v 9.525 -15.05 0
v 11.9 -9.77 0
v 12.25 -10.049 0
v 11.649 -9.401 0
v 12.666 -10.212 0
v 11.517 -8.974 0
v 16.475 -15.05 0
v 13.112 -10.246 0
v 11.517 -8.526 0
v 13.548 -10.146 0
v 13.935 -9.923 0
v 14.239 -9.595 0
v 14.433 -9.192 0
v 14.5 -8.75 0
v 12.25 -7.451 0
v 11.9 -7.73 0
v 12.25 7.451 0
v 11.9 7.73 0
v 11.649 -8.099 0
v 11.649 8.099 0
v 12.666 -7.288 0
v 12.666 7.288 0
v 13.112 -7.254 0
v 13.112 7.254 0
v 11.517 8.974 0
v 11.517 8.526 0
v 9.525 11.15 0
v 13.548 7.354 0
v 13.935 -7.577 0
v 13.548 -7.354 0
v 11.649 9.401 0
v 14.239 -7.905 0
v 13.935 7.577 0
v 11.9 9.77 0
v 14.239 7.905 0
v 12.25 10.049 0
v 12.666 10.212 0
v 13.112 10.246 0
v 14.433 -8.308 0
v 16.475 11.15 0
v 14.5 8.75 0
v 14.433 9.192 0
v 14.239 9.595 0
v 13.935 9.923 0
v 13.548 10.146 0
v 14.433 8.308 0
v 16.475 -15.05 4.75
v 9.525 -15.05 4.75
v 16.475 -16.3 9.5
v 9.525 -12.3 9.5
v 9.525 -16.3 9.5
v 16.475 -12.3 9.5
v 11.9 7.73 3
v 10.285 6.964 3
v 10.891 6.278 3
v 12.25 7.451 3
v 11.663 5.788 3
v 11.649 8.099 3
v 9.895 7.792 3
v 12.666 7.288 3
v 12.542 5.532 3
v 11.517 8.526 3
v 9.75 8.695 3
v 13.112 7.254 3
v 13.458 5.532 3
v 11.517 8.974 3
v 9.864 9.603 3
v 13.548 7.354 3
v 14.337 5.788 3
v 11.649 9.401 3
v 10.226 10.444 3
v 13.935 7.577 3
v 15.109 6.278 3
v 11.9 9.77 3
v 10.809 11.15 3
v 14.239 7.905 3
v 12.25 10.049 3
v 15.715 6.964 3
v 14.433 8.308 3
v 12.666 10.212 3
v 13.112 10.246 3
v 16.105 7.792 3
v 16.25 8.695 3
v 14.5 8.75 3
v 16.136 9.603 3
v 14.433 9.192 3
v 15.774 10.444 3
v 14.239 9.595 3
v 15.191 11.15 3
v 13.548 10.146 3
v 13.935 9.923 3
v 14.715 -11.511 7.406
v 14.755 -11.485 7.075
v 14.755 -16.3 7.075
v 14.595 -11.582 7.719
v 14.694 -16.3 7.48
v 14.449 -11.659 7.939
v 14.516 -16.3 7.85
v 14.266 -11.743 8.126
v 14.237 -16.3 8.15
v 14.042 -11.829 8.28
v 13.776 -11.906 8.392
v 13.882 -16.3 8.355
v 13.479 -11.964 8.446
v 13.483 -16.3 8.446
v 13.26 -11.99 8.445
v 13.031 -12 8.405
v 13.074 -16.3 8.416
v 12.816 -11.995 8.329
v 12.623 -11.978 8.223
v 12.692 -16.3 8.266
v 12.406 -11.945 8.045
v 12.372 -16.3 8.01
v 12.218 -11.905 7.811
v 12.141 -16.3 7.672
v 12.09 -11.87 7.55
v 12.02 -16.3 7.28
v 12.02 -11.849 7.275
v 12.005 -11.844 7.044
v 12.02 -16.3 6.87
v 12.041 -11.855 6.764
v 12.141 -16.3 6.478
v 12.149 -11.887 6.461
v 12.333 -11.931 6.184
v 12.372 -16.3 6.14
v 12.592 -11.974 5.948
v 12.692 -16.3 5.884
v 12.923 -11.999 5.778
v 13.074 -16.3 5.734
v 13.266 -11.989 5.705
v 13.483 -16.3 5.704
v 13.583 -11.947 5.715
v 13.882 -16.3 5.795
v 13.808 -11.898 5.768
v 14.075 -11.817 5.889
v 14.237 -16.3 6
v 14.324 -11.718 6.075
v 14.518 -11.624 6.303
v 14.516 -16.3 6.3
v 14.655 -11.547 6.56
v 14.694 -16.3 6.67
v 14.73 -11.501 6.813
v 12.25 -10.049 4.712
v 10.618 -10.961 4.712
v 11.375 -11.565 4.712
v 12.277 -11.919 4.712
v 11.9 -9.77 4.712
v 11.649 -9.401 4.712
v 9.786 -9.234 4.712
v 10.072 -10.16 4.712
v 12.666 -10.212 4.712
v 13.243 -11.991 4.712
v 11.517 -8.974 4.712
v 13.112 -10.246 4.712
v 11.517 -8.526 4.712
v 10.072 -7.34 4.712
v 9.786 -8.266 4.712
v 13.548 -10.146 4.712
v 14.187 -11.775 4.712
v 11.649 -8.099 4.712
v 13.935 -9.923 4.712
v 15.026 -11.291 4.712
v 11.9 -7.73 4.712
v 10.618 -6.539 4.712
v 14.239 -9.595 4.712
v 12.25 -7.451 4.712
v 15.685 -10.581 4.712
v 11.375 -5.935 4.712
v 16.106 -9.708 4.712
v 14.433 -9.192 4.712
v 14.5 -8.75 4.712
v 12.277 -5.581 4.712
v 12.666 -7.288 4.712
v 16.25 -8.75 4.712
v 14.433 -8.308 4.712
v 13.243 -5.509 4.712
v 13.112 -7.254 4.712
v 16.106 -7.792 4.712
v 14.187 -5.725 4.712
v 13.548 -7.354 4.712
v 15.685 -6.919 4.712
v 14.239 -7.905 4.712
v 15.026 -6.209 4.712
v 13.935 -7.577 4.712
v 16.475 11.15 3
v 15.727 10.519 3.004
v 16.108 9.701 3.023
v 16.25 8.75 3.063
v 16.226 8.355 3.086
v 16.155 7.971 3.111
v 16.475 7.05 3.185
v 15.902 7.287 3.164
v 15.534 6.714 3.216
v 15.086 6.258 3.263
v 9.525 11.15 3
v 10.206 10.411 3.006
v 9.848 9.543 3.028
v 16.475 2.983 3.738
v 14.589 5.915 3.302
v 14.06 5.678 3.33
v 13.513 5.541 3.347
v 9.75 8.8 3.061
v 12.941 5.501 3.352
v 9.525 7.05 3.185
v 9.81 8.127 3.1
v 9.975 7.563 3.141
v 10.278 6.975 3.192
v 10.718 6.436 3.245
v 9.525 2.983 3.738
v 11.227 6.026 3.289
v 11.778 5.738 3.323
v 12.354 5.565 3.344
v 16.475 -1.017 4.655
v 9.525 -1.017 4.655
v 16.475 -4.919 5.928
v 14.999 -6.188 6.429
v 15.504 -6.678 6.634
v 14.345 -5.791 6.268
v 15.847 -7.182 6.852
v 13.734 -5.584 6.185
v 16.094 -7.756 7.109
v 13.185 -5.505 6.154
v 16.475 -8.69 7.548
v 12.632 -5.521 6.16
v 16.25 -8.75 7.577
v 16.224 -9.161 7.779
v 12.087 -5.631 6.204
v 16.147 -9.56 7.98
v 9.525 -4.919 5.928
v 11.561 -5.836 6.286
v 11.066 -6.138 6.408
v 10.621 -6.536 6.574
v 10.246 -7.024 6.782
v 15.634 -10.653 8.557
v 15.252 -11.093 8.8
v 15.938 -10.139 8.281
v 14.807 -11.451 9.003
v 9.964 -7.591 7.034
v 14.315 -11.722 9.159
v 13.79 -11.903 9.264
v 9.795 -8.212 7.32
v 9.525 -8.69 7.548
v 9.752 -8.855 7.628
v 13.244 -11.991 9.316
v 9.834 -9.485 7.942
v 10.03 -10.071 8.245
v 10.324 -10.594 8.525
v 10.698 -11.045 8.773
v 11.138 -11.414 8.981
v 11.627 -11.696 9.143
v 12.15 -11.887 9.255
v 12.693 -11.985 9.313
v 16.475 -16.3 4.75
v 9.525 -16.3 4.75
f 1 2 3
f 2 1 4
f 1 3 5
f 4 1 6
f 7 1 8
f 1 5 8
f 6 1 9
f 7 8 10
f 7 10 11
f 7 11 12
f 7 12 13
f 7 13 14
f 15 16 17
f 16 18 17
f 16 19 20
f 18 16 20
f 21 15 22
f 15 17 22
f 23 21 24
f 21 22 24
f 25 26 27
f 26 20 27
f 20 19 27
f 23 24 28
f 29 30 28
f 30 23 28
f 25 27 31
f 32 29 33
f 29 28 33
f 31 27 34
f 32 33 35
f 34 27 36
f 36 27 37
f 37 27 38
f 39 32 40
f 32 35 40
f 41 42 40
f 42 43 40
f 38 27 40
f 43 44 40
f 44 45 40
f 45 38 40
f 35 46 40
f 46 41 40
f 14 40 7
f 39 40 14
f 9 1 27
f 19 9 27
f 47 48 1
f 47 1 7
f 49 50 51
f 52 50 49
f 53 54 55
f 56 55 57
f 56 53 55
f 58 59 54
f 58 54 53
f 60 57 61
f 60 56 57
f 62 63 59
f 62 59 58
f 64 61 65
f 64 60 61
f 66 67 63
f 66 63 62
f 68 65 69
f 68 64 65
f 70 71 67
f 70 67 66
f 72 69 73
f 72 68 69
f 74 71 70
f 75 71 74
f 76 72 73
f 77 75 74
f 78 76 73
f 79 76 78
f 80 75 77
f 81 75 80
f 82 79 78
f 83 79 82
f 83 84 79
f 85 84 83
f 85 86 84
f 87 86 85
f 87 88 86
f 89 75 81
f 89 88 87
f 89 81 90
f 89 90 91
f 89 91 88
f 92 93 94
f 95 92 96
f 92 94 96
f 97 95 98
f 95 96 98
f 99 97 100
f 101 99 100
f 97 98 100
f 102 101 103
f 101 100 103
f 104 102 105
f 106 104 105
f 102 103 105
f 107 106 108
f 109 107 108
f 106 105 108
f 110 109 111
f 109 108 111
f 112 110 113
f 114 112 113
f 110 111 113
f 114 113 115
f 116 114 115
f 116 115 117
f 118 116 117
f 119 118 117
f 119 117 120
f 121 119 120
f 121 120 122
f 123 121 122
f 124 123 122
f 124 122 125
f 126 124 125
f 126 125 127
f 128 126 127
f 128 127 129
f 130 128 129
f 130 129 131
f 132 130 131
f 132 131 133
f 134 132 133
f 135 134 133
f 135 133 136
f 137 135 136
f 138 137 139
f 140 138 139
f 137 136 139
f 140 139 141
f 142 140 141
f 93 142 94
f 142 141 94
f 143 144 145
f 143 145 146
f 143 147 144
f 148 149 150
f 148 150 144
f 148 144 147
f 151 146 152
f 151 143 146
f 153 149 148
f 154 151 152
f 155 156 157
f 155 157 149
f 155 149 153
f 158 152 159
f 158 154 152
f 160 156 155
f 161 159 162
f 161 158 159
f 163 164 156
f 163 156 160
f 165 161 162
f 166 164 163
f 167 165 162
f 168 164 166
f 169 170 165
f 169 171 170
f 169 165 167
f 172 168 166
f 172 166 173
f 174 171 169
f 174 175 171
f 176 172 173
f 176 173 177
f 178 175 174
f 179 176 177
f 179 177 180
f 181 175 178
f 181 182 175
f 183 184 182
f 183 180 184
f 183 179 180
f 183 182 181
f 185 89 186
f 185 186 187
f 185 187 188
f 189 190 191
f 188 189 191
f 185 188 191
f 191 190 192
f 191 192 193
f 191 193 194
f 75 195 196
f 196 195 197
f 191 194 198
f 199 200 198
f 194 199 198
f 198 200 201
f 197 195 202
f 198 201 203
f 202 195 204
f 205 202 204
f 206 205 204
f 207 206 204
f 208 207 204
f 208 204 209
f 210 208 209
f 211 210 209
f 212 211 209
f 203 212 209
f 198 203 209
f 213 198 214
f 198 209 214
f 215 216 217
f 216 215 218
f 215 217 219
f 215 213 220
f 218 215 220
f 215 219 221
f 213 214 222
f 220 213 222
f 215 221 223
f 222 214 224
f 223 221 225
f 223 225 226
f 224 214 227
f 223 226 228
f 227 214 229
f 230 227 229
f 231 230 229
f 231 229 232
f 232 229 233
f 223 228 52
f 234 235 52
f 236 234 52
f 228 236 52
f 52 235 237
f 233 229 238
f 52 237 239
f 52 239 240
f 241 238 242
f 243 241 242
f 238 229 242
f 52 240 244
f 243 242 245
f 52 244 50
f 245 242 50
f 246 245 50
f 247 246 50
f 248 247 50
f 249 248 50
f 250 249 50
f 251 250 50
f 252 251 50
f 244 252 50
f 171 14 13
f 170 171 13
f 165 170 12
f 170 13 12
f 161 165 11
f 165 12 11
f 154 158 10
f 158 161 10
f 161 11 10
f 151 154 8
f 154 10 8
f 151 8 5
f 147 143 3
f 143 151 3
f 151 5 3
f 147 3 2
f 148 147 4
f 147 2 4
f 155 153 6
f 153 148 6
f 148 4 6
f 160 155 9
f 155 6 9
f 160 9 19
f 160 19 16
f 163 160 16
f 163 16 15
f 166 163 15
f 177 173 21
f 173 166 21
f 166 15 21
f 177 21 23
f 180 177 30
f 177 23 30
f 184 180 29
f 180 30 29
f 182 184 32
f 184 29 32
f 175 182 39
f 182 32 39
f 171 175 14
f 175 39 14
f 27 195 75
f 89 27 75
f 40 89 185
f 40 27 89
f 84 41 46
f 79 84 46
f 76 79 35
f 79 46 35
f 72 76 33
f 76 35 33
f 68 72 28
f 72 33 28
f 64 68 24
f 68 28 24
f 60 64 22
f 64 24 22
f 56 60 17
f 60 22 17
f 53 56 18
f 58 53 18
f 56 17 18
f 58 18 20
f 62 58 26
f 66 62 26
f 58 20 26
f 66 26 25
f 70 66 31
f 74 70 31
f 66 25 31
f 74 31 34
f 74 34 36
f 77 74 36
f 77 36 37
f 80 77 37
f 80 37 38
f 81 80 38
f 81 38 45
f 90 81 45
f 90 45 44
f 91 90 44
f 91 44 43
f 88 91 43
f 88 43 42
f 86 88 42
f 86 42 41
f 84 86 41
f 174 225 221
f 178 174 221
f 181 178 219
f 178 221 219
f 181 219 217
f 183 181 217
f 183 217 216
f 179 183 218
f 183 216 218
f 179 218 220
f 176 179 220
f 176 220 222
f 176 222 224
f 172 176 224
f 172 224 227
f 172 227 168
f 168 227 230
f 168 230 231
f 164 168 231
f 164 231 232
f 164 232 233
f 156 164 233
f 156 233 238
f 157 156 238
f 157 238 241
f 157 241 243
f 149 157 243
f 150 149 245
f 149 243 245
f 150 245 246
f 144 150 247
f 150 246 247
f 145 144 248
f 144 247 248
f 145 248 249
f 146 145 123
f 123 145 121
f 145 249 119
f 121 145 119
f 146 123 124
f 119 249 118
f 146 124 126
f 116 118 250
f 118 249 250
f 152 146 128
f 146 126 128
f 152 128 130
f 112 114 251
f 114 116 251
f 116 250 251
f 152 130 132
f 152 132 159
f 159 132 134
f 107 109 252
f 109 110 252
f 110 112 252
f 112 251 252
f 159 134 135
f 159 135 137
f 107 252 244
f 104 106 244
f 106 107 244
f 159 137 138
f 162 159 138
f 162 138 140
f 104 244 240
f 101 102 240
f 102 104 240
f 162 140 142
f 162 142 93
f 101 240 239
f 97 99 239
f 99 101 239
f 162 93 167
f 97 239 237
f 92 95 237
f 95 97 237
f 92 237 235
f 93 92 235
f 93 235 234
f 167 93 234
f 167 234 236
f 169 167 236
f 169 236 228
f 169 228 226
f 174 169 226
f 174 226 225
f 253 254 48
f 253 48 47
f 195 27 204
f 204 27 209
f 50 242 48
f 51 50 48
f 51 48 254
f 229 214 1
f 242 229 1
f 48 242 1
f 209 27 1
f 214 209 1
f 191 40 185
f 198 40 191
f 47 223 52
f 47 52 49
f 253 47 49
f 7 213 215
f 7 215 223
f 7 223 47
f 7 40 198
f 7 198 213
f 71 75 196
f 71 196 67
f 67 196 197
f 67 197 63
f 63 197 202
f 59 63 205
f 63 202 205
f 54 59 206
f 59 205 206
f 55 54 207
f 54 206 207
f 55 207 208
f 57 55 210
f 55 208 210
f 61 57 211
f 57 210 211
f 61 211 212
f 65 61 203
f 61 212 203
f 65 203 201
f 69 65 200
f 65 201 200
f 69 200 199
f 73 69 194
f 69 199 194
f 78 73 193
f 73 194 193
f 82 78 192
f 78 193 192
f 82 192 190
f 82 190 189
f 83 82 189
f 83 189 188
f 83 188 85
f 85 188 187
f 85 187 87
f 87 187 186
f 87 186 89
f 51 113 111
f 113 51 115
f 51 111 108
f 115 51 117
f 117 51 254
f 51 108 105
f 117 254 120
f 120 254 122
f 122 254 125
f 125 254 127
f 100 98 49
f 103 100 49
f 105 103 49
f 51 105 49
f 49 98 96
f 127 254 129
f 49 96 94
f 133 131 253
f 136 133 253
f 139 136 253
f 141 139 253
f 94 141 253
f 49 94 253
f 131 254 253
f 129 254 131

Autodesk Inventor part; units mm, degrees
ref_plane "YZ Plane" through (0, 0, 0) normal (1, 0, 0) x (0, 1, 0)
ref_plane "XZ Plane" through (0, 0, 0) normal (0, 1, 0) x (-1, 0, 0)
ref_plane "XY Plane" through (0, 0, 0) normal (0, 0, 1) x (1, 0, 0)
sketch "Sketch1" plane through (0, 0, 0) normal (0, 0, 1) x (1, 0, 0)
  circle A0 centre (13, 8.75) radius 1.5 projected
  circle A1 centre (13, -8.75) radius 1.5 projected
  line L0 (9.525, 11.15) -> (16.475, 11.15)
  line L1 (16.475, 11.15) -> (16.475, -16.3)
  line L2 (9.525, 11.15) -> (9.525, -16.3)
  line L3 (9.525, -16.3) -> (16.475, -16.3)
  point P0 (0, 0)
  dimension "d0" = 27.45
  dimension "d1" = 3.475
  dimension "d2" = 2.4
  dimension "d3" = 3.475
extrude "Extrusion1" add sketch "Sketch1" along normal blind 9.5
sketch "Sketch2" plane through (9.525, -16.3, 0) normal (-1, 0, 0) x (0, 0, 1)
  line L0 (0, 27.45) -> (9.5, 27.45) projected
  line L1 (9.5, 0) -> (9.5, 27.45) projected
  arc A0 (3, 27.45) -> (9.5, 4) centre (48.5502, 27.45) ccw
  line L2 (0, 27.45) -> (9.5, 27.45) projected
  point P0 (0, 16.3)
  dimension "d6" = 3
  dimension "d7" = 4
extrude "Extrusion2" cut sketch "Sketch2" against normal blind 10
sketch "Sketch3" plane through (9.525, -16.3, 0) normal (0, -1, 0) x (1, 0, 0)
  line L0 (0, 0) -> (0, 9.5) projected
  line L1 (0, 0) -> (6.95, 0) projected
  line L2 (0, 4.75) -> (6.95, 4.75)
  line L3 (6.95, 4.75) -> (6.95, 0)
  line L4 (6.95, 0) -> (0, 0)
  line L5 (0, 0) -> (0, 4.75)
  circle A0 centre (3.855, 7.075) radius 1.375
  point P0 (-9.525, 0)
  dimension "d14" = 3.855
  dimension "d15" = 2.325
  dimension "d16" = 2.75
extrude "Extrusion3" cut sketch "Sketch3" against normal blind 7.9125 contours A0
extrude "Extrusion4" cut sketch "Sketch3" against normal blind 1.25 contours L0 L2 L3 L1
sketch "Sketch4" plane through (0, 0, 9.5) normal (0, 0, 1) x (1, 0, 0)
  circle A0 centre (13, -8.75) radius 3.25
  circle A1 centre (13, 8.75) radius 3.25
  circle A2 centre (13, -8.75) radius 1.5 projected
  circle A3 centre (13, 8.75) radius 1.5 projected
  point P0 (0, 0)
  dimension "d17" = 6.5
extrude "Extrusion5" cut sketch "Sketch4" against normal blind 4.7875 contours A0
extrude "Extrusion6" cut sketch "Sketch4" against normal up to surface (6.5 mm away) contours A1 | A3
properties part number "ENCODERV2PLATE"
